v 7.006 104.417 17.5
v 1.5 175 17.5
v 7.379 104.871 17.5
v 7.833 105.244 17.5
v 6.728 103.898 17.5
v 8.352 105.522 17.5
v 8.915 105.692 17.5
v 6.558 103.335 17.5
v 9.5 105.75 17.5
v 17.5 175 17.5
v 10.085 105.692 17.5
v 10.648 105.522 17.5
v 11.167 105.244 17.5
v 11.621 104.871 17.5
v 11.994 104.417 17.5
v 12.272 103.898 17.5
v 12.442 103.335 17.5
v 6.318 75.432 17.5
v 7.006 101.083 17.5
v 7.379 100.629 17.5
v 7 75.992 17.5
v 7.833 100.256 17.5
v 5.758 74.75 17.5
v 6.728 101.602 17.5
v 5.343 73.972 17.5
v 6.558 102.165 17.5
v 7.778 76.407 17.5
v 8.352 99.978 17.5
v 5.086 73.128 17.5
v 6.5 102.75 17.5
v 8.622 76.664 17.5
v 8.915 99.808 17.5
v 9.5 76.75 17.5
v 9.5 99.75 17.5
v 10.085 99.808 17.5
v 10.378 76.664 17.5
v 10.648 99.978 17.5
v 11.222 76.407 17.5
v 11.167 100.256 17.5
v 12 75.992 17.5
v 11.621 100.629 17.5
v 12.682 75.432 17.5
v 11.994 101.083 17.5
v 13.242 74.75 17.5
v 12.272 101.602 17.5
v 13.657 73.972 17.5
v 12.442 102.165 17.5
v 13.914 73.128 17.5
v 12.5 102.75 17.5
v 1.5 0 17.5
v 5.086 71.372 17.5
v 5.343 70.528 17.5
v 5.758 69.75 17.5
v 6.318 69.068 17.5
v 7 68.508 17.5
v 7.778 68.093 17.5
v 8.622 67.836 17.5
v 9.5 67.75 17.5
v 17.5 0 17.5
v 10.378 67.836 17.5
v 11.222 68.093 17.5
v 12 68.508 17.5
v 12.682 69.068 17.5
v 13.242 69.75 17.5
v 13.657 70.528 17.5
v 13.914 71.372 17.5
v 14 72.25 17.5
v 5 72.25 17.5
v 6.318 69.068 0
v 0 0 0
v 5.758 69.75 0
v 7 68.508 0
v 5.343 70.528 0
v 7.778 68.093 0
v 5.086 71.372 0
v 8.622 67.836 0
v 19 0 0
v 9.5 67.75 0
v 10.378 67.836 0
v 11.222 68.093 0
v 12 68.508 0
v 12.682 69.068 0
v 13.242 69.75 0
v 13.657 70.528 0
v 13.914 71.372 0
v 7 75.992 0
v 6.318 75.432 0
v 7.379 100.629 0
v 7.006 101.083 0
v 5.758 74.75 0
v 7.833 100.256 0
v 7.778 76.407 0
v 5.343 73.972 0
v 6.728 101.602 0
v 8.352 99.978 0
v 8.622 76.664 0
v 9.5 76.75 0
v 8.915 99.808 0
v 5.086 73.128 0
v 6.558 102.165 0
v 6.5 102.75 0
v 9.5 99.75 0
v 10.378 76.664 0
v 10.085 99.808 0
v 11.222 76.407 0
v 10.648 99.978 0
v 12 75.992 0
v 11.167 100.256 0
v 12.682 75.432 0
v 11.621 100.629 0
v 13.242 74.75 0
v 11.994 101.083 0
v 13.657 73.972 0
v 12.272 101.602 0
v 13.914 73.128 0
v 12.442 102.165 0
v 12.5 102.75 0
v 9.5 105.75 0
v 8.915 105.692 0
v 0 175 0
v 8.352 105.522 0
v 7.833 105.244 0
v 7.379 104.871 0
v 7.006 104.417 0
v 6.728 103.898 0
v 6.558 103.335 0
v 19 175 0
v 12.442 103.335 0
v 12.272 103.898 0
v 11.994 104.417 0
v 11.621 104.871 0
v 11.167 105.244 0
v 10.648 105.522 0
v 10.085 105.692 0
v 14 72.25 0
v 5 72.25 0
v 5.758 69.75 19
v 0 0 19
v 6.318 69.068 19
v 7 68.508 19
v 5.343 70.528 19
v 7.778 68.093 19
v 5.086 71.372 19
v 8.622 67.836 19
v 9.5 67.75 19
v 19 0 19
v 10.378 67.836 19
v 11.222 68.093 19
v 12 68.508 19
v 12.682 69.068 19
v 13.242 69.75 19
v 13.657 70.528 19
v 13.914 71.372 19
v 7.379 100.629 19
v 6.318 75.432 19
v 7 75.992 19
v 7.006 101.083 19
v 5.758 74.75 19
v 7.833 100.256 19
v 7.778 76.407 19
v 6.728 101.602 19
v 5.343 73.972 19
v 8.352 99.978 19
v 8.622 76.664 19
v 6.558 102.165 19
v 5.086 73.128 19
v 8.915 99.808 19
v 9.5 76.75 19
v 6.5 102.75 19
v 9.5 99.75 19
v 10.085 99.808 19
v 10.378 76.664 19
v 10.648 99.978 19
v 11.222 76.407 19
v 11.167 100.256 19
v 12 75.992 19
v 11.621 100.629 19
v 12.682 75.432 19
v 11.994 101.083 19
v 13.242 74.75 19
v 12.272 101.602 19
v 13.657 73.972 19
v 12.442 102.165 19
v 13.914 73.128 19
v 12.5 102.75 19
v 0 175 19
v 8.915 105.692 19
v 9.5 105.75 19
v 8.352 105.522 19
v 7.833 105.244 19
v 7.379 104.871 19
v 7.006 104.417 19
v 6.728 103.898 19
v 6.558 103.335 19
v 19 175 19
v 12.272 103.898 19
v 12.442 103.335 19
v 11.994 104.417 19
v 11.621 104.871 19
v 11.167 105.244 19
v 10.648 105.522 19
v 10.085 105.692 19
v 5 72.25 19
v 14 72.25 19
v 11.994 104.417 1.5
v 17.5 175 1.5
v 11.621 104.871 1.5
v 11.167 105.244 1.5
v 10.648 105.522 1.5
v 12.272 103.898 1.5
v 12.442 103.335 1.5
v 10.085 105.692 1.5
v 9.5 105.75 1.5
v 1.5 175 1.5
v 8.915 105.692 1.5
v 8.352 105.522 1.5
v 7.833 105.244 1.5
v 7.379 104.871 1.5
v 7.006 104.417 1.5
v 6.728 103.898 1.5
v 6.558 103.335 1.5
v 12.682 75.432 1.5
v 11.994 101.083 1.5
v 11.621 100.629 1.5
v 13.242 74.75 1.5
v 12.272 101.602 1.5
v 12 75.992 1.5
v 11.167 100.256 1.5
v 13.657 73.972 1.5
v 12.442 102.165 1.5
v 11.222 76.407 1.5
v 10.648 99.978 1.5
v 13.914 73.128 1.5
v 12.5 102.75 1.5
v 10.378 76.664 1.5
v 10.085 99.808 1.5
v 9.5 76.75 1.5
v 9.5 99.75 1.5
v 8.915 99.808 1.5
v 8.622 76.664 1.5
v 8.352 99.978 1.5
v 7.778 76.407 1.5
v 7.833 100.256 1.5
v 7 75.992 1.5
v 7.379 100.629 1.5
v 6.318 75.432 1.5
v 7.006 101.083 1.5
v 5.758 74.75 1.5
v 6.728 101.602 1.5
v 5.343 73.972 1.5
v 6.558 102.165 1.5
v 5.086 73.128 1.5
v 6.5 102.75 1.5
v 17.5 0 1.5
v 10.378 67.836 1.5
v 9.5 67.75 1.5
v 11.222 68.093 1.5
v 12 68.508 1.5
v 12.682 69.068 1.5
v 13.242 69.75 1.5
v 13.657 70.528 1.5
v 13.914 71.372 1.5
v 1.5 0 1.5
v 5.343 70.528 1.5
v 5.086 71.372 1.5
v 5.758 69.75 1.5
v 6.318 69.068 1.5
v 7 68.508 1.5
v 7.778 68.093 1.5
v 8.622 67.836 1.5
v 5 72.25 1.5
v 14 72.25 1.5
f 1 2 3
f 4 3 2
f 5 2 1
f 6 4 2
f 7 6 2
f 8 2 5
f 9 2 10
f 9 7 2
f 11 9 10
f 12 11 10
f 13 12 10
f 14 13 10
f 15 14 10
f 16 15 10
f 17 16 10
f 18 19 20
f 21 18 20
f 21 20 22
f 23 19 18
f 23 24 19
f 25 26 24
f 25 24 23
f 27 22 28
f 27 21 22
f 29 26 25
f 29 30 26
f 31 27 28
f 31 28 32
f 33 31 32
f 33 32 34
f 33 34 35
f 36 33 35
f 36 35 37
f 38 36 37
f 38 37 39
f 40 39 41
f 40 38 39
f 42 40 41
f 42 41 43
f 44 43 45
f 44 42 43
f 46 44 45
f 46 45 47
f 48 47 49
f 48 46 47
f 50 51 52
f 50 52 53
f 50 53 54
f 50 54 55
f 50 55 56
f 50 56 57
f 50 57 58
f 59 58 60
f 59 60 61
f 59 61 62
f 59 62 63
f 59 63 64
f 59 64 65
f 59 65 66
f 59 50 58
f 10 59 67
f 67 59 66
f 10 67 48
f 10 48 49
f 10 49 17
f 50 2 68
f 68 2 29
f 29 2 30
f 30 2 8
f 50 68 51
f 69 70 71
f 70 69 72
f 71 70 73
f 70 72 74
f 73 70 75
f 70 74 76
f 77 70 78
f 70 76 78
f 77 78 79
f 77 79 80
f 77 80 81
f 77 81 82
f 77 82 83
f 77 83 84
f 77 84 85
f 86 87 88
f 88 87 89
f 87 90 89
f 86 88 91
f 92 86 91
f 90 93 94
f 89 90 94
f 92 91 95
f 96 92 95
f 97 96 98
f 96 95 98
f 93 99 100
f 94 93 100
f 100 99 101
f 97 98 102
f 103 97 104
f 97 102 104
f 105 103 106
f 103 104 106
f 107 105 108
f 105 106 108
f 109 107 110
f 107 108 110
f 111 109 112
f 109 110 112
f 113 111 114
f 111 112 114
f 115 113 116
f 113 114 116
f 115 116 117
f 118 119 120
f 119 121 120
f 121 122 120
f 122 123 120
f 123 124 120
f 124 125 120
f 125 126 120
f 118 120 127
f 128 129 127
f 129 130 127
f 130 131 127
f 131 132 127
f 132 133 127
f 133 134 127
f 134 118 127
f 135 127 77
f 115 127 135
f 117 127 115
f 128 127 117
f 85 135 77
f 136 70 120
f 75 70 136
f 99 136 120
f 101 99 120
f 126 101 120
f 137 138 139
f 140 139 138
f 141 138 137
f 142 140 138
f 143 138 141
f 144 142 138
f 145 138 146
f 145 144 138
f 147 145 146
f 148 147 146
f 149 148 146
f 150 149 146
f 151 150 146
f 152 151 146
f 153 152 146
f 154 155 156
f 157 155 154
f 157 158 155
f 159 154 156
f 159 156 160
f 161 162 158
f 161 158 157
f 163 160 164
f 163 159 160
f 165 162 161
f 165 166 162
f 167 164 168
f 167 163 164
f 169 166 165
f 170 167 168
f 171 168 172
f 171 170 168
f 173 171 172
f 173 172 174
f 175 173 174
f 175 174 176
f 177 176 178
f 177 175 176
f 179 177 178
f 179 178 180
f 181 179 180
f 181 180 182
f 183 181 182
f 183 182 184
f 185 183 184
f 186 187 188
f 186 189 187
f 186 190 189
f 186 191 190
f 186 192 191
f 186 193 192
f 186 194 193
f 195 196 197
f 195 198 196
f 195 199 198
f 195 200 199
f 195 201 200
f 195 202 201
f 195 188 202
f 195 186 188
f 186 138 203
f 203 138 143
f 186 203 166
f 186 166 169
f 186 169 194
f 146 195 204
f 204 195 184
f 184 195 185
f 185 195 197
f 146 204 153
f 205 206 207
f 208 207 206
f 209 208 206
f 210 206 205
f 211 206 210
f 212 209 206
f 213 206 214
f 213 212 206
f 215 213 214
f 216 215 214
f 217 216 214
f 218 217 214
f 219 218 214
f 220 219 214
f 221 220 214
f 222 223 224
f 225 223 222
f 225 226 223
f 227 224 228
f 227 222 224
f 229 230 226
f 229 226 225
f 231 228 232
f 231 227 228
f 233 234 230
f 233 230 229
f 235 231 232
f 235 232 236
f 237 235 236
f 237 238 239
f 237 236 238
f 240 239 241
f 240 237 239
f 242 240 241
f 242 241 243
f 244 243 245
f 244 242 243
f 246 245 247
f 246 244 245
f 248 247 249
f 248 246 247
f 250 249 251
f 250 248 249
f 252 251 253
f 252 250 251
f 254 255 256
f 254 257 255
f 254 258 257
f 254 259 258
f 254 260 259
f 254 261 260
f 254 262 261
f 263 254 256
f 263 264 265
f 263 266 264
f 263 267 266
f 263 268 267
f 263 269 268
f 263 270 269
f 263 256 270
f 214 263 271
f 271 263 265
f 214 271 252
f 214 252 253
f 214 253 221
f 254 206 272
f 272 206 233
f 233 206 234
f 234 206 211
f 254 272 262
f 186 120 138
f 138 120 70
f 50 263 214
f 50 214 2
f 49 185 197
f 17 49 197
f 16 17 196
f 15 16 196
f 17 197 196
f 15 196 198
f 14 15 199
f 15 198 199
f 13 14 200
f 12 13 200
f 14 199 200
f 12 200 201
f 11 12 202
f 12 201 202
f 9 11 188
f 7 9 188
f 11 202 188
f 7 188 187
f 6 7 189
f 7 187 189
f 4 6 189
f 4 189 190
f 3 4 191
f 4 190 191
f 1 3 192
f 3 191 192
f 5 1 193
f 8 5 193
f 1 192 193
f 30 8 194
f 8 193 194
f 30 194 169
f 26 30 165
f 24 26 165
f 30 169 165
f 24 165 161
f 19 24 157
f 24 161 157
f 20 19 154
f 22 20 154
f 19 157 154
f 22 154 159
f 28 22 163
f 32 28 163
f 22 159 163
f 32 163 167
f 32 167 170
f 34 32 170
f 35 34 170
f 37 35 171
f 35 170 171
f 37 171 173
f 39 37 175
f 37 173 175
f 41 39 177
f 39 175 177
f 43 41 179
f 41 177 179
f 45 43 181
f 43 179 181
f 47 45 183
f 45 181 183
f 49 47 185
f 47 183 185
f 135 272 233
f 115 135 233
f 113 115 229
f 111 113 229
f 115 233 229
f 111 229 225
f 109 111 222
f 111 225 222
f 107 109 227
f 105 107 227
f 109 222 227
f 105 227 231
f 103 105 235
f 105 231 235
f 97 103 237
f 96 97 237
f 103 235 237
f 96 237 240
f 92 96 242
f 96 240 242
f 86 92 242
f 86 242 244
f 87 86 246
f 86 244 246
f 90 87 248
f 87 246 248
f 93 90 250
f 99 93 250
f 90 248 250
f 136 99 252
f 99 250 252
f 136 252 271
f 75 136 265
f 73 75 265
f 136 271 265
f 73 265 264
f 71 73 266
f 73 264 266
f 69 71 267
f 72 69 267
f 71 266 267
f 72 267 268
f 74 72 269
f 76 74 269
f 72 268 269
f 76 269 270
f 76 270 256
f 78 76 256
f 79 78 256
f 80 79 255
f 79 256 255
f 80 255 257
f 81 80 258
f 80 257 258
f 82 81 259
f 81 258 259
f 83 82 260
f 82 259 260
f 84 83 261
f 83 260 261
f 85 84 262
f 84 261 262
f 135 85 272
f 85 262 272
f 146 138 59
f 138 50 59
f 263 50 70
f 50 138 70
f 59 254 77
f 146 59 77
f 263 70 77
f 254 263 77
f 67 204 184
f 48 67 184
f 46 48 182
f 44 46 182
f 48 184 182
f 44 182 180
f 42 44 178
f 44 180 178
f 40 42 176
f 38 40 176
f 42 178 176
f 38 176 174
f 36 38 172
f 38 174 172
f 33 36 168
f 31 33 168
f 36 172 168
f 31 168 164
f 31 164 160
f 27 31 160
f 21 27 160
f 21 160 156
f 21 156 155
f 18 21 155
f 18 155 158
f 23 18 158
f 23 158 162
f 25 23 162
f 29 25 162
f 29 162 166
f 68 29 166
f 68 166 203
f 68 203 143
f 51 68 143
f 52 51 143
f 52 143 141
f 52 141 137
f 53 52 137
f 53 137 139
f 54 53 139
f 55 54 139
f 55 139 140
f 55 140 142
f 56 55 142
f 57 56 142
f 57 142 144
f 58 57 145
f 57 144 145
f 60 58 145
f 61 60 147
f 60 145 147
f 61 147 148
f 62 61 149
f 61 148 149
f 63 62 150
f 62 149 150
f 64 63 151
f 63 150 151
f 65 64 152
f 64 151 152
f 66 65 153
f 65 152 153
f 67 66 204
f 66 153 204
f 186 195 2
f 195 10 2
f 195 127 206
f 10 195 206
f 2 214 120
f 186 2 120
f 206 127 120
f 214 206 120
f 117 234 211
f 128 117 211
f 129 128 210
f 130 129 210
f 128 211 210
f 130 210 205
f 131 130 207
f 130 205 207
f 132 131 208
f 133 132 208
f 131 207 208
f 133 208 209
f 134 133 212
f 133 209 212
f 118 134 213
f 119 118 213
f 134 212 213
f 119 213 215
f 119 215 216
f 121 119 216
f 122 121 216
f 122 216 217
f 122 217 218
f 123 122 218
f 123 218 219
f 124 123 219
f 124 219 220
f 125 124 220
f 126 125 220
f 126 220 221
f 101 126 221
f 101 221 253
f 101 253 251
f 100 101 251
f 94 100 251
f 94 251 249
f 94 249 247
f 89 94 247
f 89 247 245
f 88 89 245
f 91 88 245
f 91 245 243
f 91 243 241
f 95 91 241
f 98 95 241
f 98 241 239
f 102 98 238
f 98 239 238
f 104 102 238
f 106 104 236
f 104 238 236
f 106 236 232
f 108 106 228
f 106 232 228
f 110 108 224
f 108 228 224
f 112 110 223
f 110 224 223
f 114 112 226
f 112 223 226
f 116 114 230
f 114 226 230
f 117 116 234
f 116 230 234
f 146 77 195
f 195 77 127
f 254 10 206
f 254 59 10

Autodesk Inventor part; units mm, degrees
ref_plane "YZ Plane" through (0, 0, 0) normal (1, 0, 0) x (0, 1, 0)
ref_plane "XZ Plane" through (0, 0, 0) normal (0, 1, 0) x (-1, 0, 0)
ref_plane "XY Plane" through (0, 0, 0) normal (0, 0, 1) x (1, 0, 0)
sketch "Sketch1" plane through (0, 0, 0) normal (0, 0, 1) x (1, 0, 0)
  line L0 (0, 0) -> (19, 0)
  line L1 (19, 0) -> (19, 175)
  line L2 (19, 175) -> (0, 175)
  line L3 (0, 175) -> (0, 0)
  dimension "d0" = 19
  dimension "d1" = 175
extrude "Extrusion1" add sketch "Sketch1" along normal blind 19
sketch "Sketch2" plane through (0, 0, 0) normal (0, -1, 0) x (1, 0, 0)
  line L0 (0, 0) -> (19, 0) projected
  line L1 (19, 0) -> (19, 19) projected
  line L2 (0, 19) -> (19, 19) projected
  line L3 (0, 0) -> (0, 19) projected
  line L4 (17.5, 17.5) -> (17.5, 1.5)
  line L5 (17.5, 1.5) -> (1.5, 1.5)
  line L6 (1.5, 1.5) -> (1.5, 17.5)
  line L7 (1.5, 17.5) -> (17.5, 17.5)
  dimension "d4" = 1.5
extrude "Extrusion2" cut sketch "Sketch2" against normal through all contours L4 L5 L6 L7
sketch "Sketch3" plane through (0, 0, 19) normal (0, 0, 1) x (1, 0, 0)
  line L0 (9.5, 72.25) -> (9.5, 102.75) construction
  circle A0 centre (9.5, 102.75) radius 3
  circle A1 centre (9.5, 72.25) radius 4.5
  line L1 (19, 0) -> (19, 175) projected
  line L2 (19, 175) -> (0, 175) projected
  point P0 (0, 0)
  point P1 (19, 87.5)
  point P2 (9.5, 87.5)
  point P3 (9.5, 175)
  dimension "d7" = 30.5
  dimension "d8" = 6
  dimension "d9" = 9
extrude "Extrusion3" cut sketch "Sketch3" against normal through all
properties part number "C010" material "Aluminum 6061"
